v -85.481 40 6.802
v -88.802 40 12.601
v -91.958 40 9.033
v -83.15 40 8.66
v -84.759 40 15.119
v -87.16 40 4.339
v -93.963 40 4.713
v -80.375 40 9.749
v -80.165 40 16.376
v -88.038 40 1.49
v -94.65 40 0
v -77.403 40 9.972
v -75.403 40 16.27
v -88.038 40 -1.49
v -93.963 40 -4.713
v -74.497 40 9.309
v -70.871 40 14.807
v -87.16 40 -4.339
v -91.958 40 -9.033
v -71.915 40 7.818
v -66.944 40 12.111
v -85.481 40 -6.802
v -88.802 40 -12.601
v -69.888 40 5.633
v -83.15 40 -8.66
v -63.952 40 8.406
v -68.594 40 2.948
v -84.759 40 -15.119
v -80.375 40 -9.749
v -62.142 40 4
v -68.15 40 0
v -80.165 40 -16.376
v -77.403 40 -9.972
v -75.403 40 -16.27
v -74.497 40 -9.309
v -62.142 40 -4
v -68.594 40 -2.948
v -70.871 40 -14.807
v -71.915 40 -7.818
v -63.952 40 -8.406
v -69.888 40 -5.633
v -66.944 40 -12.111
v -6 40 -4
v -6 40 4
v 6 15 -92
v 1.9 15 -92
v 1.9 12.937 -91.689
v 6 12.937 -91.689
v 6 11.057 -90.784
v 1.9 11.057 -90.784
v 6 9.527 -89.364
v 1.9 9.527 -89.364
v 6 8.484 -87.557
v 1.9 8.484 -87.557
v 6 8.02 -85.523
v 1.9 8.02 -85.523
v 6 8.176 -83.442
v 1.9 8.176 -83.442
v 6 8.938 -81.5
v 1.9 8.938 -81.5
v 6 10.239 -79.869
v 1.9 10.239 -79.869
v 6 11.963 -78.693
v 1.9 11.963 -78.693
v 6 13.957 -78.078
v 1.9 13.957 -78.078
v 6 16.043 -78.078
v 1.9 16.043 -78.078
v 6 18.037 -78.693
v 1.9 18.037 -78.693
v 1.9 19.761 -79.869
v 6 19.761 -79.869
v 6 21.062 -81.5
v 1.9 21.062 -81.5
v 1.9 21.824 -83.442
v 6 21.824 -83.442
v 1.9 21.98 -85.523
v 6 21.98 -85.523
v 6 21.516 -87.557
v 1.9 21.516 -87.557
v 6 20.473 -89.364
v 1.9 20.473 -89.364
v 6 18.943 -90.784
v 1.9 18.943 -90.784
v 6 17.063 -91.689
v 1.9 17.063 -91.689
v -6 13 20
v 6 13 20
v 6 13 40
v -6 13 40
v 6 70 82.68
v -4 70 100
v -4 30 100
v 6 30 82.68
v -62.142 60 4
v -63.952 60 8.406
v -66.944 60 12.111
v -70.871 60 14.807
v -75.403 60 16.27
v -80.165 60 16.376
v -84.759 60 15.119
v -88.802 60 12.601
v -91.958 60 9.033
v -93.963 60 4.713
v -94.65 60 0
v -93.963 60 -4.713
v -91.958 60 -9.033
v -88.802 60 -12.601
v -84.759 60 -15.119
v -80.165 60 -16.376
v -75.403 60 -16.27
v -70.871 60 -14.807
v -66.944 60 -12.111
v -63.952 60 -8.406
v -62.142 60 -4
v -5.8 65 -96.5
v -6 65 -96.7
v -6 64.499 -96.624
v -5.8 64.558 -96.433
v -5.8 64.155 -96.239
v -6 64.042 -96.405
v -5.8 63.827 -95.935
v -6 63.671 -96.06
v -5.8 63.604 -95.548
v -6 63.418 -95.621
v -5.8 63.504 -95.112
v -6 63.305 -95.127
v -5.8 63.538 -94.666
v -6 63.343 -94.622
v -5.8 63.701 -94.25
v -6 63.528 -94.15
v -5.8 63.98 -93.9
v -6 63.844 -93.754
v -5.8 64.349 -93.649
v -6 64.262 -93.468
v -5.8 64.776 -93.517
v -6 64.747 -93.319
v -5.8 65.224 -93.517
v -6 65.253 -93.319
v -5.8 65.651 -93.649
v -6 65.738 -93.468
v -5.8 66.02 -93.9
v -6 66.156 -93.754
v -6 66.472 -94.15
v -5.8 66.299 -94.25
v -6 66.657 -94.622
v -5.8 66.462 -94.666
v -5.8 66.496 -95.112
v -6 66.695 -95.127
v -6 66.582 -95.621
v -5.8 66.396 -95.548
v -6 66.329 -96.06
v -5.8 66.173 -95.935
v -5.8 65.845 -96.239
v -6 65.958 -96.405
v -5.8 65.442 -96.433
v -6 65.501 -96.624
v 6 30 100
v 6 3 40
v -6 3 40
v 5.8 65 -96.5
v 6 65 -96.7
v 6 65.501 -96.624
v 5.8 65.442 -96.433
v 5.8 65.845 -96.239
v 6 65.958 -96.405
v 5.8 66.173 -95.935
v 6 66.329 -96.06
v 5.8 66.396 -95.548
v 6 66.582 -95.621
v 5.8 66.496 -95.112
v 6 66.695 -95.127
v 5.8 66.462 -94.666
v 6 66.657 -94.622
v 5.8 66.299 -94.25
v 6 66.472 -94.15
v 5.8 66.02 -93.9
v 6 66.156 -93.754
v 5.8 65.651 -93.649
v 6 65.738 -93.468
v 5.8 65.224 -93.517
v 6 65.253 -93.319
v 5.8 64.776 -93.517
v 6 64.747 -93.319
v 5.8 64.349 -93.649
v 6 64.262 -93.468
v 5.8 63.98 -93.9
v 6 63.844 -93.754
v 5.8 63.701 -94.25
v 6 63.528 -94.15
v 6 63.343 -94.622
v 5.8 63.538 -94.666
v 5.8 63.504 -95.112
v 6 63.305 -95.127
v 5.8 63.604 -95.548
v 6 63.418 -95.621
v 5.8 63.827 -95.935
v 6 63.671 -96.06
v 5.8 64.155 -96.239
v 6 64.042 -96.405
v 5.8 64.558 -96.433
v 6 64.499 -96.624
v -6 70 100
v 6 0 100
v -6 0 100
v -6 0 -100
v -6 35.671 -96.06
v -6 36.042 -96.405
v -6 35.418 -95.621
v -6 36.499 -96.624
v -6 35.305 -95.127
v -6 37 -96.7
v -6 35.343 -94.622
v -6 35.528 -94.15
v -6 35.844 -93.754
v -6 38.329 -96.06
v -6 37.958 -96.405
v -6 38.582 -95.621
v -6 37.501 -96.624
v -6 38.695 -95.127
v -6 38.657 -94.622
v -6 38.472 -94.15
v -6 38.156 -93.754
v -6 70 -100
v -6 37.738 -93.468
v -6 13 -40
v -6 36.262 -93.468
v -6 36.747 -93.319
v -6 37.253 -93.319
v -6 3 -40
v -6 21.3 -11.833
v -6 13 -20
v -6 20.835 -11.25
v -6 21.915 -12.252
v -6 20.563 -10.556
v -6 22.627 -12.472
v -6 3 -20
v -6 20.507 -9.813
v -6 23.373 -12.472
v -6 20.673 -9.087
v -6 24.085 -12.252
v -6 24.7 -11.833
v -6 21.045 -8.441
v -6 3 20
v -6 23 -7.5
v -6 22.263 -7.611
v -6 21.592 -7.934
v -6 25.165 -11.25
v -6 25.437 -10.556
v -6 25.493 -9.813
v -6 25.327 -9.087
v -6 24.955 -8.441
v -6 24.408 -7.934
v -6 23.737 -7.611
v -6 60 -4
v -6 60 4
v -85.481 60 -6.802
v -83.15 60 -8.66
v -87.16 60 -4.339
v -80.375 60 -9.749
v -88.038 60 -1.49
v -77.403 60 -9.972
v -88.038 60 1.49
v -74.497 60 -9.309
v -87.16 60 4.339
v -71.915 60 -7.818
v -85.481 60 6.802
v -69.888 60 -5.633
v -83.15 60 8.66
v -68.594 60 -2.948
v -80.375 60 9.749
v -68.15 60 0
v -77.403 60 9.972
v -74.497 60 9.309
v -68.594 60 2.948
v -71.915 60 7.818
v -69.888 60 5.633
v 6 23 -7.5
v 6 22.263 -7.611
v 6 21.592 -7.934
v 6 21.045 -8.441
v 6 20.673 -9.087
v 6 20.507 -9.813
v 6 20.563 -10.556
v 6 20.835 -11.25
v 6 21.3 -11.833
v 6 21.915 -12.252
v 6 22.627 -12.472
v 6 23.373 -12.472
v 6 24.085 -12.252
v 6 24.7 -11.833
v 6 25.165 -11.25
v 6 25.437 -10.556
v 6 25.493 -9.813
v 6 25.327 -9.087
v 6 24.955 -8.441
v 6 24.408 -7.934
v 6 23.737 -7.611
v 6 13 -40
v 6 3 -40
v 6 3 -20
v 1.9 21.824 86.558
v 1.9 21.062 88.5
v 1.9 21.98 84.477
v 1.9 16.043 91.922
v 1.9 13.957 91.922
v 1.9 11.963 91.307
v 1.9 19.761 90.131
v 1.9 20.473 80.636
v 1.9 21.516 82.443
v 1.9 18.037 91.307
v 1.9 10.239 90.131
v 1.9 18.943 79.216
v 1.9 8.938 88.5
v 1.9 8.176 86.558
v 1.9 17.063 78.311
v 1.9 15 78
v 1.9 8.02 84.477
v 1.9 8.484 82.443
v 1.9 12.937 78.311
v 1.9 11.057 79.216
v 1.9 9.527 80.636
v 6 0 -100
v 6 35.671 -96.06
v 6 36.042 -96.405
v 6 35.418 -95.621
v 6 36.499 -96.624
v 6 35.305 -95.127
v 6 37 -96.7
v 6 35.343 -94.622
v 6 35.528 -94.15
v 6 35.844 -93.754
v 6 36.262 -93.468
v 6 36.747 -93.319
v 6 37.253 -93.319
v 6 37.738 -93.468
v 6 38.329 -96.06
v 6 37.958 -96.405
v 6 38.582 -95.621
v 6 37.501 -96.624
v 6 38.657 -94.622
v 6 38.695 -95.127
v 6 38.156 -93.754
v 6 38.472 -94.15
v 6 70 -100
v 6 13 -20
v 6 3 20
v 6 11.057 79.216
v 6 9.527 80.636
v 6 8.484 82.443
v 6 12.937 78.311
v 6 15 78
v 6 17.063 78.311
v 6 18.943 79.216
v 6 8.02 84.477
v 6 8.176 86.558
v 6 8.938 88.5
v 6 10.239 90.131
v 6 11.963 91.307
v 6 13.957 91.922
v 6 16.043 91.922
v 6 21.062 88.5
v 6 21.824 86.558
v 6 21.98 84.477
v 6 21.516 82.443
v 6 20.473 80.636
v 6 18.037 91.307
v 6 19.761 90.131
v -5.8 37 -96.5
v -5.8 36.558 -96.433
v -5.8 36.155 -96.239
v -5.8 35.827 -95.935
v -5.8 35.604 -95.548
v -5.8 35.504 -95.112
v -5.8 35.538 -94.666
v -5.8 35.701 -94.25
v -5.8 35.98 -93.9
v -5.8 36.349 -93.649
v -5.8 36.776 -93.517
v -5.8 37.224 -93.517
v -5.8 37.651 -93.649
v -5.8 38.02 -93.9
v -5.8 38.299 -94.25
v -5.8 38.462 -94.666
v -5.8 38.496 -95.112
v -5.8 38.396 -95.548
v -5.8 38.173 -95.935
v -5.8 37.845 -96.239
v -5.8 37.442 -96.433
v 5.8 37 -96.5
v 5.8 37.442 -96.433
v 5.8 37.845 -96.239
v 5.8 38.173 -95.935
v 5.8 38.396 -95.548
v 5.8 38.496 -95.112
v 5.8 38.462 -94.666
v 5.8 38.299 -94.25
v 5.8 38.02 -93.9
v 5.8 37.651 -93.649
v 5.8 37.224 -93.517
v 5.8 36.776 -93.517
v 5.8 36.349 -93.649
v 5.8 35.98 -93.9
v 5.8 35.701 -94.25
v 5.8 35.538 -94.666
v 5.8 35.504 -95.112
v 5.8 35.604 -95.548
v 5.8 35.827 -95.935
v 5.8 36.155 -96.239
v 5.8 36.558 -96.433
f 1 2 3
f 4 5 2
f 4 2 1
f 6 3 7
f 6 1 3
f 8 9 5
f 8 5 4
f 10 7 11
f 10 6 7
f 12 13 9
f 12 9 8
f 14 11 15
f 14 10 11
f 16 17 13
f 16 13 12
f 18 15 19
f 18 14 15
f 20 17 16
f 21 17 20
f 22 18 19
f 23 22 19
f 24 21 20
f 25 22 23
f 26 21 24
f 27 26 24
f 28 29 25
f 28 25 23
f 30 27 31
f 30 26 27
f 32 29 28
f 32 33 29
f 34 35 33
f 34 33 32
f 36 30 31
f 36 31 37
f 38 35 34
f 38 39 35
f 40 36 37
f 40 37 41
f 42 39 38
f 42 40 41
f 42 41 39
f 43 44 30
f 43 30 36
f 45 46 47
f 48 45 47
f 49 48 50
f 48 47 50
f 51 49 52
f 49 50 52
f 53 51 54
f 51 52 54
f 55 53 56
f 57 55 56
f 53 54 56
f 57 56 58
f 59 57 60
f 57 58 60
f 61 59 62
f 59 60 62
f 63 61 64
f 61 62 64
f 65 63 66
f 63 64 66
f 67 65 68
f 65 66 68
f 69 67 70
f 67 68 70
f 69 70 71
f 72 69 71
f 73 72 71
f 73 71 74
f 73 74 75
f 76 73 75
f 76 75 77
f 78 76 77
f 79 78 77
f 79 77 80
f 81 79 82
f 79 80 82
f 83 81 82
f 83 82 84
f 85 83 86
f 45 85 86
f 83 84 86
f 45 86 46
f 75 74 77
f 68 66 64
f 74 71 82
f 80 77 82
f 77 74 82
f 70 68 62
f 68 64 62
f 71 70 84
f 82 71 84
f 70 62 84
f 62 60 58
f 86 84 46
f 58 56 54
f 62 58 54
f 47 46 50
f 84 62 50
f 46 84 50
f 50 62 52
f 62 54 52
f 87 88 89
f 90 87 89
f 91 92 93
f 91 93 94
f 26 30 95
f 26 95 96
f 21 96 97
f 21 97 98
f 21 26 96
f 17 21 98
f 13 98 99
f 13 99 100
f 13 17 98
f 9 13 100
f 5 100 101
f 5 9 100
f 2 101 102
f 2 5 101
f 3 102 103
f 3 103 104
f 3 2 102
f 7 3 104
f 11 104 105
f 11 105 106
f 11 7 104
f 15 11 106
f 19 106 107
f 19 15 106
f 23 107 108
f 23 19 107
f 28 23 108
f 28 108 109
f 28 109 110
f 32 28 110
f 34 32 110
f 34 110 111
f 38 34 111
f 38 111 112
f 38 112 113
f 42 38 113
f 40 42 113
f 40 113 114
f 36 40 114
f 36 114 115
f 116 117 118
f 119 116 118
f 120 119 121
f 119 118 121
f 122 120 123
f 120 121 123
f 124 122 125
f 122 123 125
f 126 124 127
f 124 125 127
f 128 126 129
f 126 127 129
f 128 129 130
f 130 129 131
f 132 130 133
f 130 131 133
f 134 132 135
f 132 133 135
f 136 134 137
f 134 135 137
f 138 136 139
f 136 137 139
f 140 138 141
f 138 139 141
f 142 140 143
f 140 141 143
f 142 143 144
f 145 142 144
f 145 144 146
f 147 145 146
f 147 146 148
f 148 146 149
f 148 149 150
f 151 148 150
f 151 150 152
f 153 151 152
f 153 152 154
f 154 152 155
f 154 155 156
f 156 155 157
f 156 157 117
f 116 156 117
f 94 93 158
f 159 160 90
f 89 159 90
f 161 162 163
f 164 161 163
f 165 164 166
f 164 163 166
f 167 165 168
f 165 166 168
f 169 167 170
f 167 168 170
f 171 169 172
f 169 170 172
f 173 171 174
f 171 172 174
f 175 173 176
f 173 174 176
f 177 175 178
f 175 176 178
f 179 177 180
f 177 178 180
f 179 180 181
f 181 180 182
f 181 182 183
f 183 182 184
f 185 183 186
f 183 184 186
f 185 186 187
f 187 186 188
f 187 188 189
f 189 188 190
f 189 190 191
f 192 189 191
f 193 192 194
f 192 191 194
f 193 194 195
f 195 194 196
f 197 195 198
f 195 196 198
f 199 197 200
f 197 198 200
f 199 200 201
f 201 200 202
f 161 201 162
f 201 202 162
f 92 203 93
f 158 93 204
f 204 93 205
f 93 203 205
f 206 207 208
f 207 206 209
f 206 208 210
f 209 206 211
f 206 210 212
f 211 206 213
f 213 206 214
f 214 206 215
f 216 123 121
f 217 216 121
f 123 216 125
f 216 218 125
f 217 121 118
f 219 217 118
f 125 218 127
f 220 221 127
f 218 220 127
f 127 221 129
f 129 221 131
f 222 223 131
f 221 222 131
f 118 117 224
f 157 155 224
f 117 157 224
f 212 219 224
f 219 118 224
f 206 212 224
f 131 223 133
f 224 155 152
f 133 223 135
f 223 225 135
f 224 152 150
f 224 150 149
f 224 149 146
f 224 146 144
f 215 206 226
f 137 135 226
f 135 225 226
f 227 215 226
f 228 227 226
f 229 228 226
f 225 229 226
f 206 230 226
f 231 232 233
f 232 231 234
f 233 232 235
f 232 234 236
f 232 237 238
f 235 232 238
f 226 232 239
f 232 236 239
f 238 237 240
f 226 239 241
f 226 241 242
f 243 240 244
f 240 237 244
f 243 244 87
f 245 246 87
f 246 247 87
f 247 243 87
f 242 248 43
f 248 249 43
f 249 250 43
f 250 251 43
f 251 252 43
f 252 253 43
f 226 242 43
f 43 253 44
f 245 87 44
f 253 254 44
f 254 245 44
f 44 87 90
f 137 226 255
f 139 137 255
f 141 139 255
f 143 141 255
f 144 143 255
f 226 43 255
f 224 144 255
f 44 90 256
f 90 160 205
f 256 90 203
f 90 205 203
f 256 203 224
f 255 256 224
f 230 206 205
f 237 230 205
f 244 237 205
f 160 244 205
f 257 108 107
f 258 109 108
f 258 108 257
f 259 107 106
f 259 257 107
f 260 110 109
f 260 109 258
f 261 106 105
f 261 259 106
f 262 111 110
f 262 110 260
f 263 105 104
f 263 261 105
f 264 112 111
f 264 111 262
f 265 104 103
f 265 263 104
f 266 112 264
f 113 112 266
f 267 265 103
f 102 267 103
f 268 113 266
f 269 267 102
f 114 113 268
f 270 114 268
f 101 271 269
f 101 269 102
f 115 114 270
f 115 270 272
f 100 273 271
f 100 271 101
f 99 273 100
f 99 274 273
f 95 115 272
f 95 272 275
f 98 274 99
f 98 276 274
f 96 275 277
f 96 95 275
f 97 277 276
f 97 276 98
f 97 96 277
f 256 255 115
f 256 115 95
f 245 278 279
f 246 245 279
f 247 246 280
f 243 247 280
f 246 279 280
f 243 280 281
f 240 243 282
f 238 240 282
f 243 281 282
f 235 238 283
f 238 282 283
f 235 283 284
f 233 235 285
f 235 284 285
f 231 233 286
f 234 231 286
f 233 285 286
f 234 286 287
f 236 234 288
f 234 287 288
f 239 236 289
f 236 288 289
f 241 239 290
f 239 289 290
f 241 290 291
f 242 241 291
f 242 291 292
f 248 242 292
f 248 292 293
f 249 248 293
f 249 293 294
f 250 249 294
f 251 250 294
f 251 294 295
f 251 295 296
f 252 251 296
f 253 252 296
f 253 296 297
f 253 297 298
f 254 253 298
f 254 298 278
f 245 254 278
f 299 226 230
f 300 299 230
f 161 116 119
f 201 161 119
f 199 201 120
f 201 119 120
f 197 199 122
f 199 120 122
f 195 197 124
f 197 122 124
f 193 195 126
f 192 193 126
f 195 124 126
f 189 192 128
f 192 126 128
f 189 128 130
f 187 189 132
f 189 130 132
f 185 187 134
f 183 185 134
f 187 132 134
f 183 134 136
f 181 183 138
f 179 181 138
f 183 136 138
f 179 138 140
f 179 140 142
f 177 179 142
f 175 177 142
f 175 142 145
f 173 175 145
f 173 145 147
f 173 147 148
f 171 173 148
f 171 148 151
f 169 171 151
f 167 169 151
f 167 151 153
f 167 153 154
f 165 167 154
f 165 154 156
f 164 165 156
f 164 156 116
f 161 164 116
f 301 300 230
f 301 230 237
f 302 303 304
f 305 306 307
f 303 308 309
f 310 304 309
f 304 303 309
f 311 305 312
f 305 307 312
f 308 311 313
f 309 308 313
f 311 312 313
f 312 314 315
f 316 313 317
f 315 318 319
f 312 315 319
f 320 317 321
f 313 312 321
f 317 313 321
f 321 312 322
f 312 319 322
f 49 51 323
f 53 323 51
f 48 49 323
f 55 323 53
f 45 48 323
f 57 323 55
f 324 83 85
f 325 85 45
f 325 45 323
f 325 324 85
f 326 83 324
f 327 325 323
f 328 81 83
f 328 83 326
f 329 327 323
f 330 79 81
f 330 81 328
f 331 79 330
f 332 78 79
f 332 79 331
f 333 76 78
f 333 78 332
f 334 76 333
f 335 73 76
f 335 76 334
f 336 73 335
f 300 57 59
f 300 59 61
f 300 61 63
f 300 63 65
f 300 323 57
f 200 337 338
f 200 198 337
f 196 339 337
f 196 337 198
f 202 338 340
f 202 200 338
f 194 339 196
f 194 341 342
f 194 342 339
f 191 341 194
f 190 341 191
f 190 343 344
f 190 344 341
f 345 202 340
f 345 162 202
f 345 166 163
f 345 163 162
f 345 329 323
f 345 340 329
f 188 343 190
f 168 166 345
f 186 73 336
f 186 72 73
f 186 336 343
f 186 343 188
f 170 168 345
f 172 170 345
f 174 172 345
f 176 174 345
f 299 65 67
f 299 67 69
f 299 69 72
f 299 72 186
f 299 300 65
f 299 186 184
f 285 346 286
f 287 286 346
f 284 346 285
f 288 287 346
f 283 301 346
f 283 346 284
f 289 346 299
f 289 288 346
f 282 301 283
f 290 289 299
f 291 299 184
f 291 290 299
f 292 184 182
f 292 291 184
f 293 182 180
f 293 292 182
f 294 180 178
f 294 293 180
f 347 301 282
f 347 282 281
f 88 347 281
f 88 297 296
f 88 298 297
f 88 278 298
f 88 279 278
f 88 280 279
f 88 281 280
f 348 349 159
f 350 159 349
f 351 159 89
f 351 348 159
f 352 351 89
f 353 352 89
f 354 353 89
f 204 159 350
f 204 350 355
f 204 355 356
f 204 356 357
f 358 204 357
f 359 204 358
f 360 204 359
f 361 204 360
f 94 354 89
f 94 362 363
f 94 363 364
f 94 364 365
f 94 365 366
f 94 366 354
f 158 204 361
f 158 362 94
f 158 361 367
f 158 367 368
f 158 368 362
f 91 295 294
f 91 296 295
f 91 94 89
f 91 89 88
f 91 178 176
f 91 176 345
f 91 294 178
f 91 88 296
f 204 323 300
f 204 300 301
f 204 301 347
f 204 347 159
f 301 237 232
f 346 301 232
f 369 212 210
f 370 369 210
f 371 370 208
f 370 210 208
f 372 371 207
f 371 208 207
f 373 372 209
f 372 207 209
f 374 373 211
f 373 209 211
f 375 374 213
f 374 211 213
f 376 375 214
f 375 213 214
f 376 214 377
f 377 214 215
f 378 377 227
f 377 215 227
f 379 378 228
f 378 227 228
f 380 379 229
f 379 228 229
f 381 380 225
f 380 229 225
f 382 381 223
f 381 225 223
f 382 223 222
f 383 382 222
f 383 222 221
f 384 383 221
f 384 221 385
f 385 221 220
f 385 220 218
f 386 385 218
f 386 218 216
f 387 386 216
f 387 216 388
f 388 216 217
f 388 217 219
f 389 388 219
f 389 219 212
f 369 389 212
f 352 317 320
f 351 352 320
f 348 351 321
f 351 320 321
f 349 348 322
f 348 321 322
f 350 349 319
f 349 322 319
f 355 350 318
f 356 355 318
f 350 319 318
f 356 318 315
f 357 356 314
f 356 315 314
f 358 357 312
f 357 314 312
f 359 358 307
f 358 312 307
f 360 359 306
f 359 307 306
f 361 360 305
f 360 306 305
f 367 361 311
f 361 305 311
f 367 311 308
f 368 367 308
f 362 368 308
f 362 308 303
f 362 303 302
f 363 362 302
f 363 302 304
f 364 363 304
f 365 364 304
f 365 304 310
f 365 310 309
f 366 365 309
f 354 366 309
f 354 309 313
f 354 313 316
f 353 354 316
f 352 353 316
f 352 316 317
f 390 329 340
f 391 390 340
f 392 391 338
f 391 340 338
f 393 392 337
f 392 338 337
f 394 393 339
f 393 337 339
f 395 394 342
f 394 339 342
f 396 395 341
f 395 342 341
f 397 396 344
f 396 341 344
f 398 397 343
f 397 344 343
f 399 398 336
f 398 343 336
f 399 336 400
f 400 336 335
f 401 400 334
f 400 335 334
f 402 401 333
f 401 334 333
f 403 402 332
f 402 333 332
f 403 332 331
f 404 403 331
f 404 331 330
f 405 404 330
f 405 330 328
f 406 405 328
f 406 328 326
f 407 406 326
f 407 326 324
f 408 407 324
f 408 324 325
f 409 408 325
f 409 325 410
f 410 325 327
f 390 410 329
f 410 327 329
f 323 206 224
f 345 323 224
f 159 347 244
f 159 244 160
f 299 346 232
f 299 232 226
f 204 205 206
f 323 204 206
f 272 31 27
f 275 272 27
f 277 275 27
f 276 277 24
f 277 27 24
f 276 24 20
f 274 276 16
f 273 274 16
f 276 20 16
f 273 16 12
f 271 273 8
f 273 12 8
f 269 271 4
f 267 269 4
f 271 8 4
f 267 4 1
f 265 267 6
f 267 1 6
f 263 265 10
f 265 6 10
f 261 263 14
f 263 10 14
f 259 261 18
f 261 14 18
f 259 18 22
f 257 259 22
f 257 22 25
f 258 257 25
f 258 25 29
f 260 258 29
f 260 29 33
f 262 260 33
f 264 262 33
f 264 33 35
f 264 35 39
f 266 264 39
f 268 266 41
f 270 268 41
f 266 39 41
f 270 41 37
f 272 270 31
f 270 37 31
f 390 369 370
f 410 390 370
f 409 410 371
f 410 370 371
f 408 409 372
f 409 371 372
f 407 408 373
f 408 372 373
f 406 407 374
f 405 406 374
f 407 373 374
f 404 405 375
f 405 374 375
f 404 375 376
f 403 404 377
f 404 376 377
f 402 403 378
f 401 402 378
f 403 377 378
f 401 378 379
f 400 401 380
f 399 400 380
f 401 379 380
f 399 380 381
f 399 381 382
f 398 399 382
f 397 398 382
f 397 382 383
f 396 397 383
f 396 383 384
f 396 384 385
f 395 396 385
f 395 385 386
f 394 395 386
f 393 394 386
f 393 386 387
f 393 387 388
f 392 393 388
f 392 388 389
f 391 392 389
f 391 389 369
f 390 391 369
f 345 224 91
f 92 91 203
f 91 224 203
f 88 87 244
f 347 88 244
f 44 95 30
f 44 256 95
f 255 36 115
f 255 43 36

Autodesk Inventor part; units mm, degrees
ref_plane "YZ Plane" through (0, 0, 0) normal (1, 0, 0) x (0, 1, 0)
ref_plane "XZ Plane" through (0, 0, 0) normal (0, 1, 0) x (-1, 0, 0)
ref_plane "XY Plane" through (0, 0, 0) normal (0, 0, 1) x (1, 0, 0)
sketch "Эскиз1" plane through (0, 0, 0) normal (1, 0, 0) x (0, 1, 0)
  line L0 (0, 100) -> (0, -100)
  line L1 (0, -100) -> (30, -100)
  line L2 (30, -100) -> (30, 100)
  line L3 (30, 100) -> (0, 100)
  line L4 (-14, 0) -> (84, 0) construction
  line L5 (0, -140) -> (0, 140) construction
  line L6 (30, -100) -> (70, -100)
  line L7 (70, -100) -> (70, 100)
  line L8 (70, 100) -> (30, 100)
  line L9 (30, 100) -> (30, -100)
  point P0 (0, 0)
  point P1 (30, 100)
  dimension "d0" = 200
  dimension "d1" = 30
  dimension "d2" = 200
  dimension "d3" = 40
extrude "Выдавливание1" add sketch "Эскиз1" along normal mid plane 12
sketch "Эскиз2" plane through (6, 0, 0) normal (1, 0, 0) x (0, 0, -1)
  line L0 (-20, 13) -> (-40, 13)
  line L1 (-100, 0) -> (100, 0) construction
  line L2 (100, 0) -> (100, 70) projected
  line L3 (-40, 13) -> (-20, 13)
  line L4 (-20, 13) -> (-20, 3)
  line L5 (-20, 3) -> (-40, 3)
  line L6 (-40, 3) -> (-40, 13)
  line L7 (20, 13) -> (40, 13)
  line L8 (40, 13) -> (40, 3)
  line L9 (40, 3) -> (20, 3)
  line L10 (20, 3) -> (20, 13)
  point P0 (0, 0)
  point P1 (-85, 0)
  point P2 (57.0517, 0.6179)
  dimension "d26" = 10
  dimension "d27" = 20
  dimension "d28" = 3
  dimension "d29" = 20
  dimension "d31" = 20
  dimension "d34" = 3
  dimension "d35" = 10
  dimension "d36" = 20
extrude "Выдавливание2" cut sketch "Эскиз2" against normal blind 12
sketch "Эскиз3" plane through (6, 0, 0) normal (1, 0, 0) x (0, 0, -1)
  line L0 (100, 0) -> (100, 70) projected
  line L1 (100, 0) -> (-100, 0) projected
  line L2 (-100, 0) -> (-100, 70) projected
  point P0 (0, 0)
  point P1 (-85, 15)
  point P2 (-85, 0)
  point P3 (-85, 15)
  point P4 (85, 15)
  point P5 (-100, 15)
  dimension "d17" = 15
  dimension "d53" = 15
  dimension "d54" = 15
hole "Отверстие1" at (6, 15, -85) at (6, 15, 85) direction (-1, 0, 0) diameter 14 depth 4.1
sketch "Эскиз4" plane through (6, 0, 0) normal (1, 0, 0) x (0, 0, -1)
  line L0 (100, 70) -> (-100, 70) projected
  line L1 (-100, 70) -> (-100, 0) projected
  line L2 (90, 30) -> (-85, 30) projected
  line L3 (100, 0) -> (100, 70) projected
  line L4 (100, 0) -> (-100, 0) projected
  point P0 (0, 0)
  point P1 (95, 65)
  point P2 (95, 37)
  point P3 (-100, 15)
  point P4 (-85, 0)
  dimension "d37" = 5
  dimension "d40" = 5
  dimension "d51" = 5
  dimension "d52" = 37
hole "Отверстие2" at (6, 65, -95) at (6, 37, -95) direction (-1, 0, 0) diameter 3 depth 70
chamfer "Фаска1" distance 0.2 angle 45 4 edges at (6, 37, -93.5) (6, 65, -93.5) (-6, 37, -93.5) (-6, 65, -93.5)
sketch "Эскиз5" plane through (-6, 70, 100) normal (0, 1, 0) x (1, 0, 0)
  line L0 (12, 0) -> (0, 0) projected
  line L1 (2, 0) -> (12, 17.3205)
  line L2 (12, 200) -> (12, 0) projected
  line L3 (12, 0) -> (2, 0)
  line L4 (12, 15) -> (12, 0) projected
  line L5 (12, 0) -> (12, 17.3205)
  point P0 (6, 100)
  dimension "d60" = 30
  dimension "d61" = 10
extrude "Выдавливание3" cut sketch "Эскиз5" against normal blind 40
sketch "Эскиз6" plane through (-6, 0, 0) normal (-1, 0, 0) x (0, 0, 1)
  line L0 (-40, 13) -> (-20, 13) projected
  point P0 (0, 0)
  point P1 (-10, 23)
  dimension "d62" = 10
  dimension "d63" = 10
hole "Отверстие3" at (-6, 23, -10) direction (1, 0, 0) diameter 5 depth 60
sketch "Эскиз7" plane through (-6, 0, 0) normal (-1, 0, 0) x (0, 0, 1)
  line L0 (-4, 60) -> (4, 60)
  line L1 (4, 60) -> (4, 40)
  line L2 (4, 40) -> (-4, 40)
  line L3 (-4, 40) -> (-4, 60)
  line L4 (0, 0) -> (0, 6.9143) construction
  line L5 (-100, 0) -> (100, 0) projected
  dimension "d71" = 8
  dimension "d72" = 20
  dimension "d73" = 40
extrude "Выдавливание4" add sketch "Эскиз7" along normal blind 61
sketch "Эскиз10" plane through (-6, 40, -4) normal (0, -1, 0) x (1, 0, 0)
  line L0 (-104, -147.0883) -> (-50, -147.0883) projected
  line L1 (-50, 252.9117) -> (-50, -147.0883) construction
  circle A0 centre (-72.15, -8.6973) radius 16.5 construction
  circle A1 centre (-72.15, -8.6973) radius 10 construction
  circle A2 centre (-72.15, -8.6973) radius 10 construction
  circle A3 centre (-72.15, -8.6973) radius 11 construction
  circle A4 centre (-72.15, 4) radius 16.5
  circle A5 centre (-72.15, 4) radius 11
  circle A6 centre (-72.15, 4) radius 10
  line L2 (-50, 252.9117) -> (-104, 252.9117) projected
  line L3 (-104, -147.0883) -> (-104, 252.9117) projected
  point P0 (6, 4)
  point P1 (-100, 252.9117)
  dimension "d86" = 33
  dimension "d87" = 22
  dimension "d88" = 20
extrude "Выдавливание6" add sketch "Эскиз10" against normal blind 20 contours A4 | A5
equation "\"d40\" = d37"
properties part number "Стенка конвейера"
